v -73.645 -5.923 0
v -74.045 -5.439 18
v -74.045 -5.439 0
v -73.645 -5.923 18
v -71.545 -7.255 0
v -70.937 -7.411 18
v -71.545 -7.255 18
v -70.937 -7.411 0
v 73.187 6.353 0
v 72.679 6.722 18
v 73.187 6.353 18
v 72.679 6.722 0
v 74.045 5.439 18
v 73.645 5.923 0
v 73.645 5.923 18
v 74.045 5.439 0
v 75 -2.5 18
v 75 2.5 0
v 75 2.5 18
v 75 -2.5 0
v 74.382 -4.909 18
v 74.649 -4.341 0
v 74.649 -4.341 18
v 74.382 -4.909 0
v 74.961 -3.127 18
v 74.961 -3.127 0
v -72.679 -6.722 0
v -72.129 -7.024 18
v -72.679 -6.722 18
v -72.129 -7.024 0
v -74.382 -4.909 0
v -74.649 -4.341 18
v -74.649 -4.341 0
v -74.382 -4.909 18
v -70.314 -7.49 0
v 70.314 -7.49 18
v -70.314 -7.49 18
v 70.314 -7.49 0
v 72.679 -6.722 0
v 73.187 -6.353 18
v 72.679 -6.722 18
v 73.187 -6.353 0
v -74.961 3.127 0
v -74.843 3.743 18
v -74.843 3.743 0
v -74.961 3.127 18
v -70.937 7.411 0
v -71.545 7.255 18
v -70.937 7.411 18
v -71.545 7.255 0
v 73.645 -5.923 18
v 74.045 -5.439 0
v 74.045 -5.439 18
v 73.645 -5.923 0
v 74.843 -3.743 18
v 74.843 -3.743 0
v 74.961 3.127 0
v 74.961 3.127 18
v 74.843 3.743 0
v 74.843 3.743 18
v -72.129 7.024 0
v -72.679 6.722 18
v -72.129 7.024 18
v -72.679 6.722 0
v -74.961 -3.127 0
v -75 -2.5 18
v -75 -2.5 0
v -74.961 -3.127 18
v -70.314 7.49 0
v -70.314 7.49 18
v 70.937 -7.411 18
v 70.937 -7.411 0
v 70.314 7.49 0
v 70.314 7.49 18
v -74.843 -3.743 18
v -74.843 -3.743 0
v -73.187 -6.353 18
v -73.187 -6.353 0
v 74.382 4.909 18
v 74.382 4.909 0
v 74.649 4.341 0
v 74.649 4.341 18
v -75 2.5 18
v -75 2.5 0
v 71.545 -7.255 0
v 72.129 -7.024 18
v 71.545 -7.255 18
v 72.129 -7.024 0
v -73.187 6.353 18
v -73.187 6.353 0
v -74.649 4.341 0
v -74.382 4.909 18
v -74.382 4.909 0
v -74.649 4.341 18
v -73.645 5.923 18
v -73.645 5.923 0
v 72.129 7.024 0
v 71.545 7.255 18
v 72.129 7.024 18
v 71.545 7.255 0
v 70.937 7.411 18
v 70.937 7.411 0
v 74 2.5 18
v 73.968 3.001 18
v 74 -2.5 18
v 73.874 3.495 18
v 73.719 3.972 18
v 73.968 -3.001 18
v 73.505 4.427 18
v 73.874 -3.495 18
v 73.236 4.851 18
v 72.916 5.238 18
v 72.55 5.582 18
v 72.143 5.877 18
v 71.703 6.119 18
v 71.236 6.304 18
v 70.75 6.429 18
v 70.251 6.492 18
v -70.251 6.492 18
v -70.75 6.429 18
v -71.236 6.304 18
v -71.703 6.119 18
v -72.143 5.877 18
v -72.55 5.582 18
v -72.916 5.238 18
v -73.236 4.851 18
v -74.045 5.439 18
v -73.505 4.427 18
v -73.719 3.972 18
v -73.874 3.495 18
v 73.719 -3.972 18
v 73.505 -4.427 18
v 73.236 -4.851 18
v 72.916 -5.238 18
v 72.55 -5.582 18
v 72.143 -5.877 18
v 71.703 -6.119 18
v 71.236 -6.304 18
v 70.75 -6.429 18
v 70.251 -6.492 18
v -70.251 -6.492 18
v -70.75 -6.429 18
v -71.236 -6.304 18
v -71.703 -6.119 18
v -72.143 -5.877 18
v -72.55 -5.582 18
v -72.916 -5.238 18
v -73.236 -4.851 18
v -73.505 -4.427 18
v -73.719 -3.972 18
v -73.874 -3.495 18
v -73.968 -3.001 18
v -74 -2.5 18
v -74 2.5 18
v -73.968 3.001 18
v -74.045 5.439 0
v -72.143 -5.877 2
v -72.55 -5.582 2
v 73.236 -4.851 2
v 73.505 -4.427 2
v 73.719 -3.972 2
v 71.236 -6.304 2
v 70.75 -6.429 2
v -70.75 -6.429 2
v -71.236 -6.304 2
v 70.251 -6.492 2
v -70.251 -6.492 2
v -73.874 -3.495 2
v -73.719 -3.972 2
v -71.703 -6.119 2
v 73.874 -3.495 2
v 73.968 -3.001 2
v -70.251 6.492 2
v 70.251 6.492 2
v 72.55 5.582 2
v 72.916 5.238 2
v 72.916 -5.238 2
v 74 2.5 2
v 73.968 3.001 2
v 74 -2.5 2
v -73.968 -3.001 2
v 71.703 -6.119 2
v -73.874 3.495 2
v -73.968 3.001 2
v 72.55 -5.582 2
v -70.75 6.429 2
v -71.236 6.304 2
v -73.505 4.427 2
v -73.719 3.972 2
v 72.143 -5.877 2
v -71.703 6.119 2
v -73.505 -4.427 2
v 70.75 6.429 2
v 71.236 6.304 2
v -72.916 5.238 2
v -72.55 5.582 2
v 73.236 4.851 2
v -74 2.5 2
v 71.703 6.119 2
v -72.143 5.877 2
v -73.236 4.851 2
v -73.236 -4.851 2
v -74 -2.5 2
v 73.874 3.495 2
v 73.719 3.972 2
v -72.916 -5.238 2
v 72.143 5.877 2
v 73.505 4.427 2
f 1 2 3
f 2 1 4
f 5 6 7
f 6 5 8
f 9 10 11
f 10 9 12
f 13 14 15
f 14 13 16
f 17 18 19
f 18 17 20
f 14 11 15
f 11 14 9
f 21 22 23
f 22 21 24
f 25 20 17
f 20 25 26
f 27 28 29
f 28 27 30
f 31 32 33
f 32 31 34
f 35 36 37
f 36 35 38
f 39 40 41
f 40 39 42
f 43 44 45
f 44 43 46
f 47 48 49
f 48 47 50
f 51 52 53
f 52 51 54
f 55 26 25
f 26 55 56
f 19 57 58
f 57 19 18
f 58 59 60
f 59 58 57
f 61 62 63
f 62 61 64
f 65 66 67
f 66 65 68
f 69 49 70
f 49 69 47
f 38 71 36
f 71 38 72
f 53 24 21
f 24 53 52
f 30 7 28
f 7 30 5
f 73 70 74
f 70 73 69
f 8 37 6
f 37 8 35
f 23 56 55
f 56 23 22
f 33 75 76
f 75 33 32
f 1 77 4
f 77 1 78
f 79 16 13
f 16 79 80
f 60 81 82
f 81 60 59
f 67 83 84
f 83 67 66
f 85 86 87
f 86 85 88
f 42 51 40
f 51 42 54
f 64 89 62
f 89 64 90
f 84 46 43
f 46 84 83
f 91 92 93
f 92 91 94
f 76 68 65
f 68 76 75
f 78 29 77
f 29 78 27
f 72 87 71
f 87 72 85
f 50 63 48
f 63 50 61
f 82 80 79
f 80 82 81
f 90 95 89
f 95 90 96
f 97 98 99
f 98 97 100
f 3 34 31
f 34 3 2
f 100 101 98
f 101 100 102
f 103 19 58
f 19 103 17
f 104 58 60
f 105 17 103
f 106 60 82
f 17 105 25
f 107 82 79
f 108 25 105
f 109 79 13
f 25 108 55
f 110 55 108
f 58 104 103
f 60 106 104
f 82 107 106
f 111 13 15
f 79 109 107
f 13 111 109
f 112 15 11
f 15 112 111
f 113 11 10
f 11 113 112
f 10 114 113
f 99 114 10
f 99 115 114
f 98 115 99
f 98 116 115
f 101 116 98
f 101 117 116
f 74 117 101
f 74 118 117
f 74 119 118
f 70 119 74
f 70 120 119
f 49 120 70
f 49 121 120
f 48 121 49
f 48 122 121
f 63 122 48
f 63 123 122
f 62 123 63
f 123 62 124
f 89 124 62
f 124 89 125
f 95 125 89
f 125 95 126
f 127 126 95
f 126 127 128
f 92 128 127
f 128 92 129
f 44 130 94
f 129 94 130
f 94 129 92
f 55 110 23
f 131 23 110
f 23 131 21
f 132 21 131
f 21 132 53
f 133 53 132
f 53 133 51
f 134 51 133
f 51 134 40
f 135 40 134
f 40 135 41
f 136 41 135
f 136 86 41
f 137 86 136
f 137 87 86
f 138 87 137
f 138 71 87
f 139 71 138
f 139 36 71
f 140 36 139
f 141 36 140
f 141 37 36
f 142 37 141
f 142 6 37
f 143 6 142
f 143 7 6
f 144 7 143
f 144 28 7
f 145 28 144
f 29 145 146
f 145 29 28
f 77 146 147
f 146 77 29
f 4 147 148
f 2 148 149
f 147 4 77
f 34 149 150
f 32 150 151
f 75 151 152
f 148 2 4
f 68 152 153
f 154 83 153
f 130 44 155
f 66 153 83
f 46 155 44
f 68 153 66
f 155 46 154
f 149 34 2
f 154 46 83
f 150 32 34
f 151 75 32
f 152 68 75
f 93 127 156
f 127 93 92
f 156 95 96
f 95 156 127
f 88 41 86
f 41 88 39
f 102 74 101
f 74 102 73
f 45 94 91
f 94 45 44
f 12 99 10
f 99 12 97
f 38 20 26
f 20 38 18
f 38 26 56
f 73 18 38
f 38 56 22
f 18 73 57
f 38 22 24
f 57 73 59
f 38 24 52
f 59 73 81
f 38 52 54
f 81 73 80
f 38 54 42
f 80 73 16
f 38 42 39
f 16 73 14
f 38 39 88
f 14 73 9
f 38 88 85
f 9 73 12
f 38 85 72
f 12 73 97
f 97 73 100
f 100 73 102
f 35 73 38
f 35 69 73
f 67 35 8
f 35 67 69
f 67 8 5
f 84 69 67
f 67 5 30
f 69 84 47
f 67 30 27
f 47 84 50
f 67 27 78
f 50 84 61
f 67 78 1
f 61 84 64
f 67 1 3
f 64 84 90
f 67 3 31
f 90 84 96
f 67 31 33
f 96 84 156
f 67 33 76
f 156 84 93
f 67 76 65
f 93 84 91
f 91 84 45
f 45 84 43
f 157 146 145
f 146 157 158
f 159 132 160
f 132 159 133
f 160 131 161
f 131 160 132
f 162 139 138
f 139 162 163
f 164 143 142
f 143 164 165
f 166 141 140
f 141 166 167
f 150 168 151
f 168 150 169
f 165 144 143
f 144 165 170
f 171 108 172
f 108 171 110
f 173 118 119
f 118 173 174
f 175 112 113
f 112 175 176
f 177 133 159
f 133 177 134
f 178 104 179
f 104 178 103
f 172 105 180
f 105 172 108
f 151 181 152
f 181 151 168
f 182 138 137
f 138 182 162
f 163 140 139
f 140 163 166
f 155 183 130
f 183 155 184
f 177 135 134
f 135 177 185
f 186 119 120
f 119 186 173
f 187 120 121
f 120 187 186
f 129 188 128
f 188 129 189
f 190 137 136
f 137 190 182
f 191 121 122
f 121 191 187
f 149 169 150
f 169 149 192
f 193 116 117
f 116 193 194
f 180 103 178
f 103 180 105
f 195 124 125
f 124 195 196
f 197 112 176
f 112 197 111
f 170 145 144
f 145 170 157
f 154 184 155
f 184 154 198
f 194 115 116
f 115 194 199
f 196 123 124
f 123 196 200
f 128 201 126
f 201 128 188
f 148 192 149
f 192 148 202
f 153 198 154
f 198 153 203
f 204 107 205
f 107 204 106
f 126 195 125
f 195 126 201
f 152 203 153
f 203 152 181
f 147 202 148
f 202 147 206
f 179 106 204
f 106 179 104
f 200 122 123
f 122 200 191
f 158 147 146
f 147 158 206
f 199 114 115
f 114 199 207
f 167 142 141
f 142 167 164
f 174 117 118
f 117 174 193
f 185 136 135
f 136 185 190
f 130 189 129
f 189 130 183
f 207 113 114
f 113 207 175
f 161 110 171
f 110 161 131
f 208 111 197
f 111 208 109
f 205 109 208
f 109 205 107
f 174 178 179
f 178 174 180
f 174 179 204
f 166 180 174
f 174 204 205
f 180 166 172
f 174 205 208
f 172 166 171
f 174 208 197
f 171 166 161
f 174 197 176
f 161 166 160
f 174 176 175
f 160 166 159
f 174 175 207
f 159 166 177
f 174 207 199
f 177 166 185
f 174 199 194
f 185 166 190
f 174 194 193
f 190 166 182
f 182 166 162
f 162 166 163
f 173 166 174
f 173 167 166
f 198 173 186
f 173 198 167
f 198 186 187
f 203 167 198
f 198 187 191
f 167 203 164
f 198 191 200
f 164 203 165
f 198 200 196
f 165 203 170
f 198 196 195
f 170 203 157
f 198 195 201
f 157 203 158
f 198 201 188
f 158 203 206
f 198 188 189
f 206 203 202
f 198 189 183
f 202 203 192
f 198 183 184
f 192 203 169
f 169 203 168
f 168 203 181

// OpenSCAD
$fn = 50;


difference() {
	union() {
		hull() {
			translate(v = [-70.0000000000, 2.5000000000, 0]) {
				cylinder(h = 18, r = 5);
			}
			translate(v = [70.0000000000, 2.5000000000, 0]) {
				cylinder(h = 18, r = 5);
			}
			translate(v = [-70.0000000000, -2.5000000000, 0]) {
				cylinder(h = 18, r = 5);
			}
			translate(v = [70.0000000000, -2.5000000000, 0]) {
				cylinder(h = 18, r = 5);
			}
		}
	}
	union() {
		translate(v = [0, 0, 2]) {
			hull() {
				translate(v = [-70.0000000000, 2.5000000000, 0]) {
					cylinder(h = 16, r = 4);
				}
				translate(v = [70.0000000000, 2.5000000000, 0]) {
					cylinder(h = 16, r = 4);
				}
				translate(v = [-70.0000000000, -2.5000000000, 0]) {
					cylinder(h = 16, r = 4);
				}
				translate(v = [70.0000000000, -2.5000000000, 0]) {
					cylinder(h = 16, r = 4);
				}
			}
		}
	}
}
